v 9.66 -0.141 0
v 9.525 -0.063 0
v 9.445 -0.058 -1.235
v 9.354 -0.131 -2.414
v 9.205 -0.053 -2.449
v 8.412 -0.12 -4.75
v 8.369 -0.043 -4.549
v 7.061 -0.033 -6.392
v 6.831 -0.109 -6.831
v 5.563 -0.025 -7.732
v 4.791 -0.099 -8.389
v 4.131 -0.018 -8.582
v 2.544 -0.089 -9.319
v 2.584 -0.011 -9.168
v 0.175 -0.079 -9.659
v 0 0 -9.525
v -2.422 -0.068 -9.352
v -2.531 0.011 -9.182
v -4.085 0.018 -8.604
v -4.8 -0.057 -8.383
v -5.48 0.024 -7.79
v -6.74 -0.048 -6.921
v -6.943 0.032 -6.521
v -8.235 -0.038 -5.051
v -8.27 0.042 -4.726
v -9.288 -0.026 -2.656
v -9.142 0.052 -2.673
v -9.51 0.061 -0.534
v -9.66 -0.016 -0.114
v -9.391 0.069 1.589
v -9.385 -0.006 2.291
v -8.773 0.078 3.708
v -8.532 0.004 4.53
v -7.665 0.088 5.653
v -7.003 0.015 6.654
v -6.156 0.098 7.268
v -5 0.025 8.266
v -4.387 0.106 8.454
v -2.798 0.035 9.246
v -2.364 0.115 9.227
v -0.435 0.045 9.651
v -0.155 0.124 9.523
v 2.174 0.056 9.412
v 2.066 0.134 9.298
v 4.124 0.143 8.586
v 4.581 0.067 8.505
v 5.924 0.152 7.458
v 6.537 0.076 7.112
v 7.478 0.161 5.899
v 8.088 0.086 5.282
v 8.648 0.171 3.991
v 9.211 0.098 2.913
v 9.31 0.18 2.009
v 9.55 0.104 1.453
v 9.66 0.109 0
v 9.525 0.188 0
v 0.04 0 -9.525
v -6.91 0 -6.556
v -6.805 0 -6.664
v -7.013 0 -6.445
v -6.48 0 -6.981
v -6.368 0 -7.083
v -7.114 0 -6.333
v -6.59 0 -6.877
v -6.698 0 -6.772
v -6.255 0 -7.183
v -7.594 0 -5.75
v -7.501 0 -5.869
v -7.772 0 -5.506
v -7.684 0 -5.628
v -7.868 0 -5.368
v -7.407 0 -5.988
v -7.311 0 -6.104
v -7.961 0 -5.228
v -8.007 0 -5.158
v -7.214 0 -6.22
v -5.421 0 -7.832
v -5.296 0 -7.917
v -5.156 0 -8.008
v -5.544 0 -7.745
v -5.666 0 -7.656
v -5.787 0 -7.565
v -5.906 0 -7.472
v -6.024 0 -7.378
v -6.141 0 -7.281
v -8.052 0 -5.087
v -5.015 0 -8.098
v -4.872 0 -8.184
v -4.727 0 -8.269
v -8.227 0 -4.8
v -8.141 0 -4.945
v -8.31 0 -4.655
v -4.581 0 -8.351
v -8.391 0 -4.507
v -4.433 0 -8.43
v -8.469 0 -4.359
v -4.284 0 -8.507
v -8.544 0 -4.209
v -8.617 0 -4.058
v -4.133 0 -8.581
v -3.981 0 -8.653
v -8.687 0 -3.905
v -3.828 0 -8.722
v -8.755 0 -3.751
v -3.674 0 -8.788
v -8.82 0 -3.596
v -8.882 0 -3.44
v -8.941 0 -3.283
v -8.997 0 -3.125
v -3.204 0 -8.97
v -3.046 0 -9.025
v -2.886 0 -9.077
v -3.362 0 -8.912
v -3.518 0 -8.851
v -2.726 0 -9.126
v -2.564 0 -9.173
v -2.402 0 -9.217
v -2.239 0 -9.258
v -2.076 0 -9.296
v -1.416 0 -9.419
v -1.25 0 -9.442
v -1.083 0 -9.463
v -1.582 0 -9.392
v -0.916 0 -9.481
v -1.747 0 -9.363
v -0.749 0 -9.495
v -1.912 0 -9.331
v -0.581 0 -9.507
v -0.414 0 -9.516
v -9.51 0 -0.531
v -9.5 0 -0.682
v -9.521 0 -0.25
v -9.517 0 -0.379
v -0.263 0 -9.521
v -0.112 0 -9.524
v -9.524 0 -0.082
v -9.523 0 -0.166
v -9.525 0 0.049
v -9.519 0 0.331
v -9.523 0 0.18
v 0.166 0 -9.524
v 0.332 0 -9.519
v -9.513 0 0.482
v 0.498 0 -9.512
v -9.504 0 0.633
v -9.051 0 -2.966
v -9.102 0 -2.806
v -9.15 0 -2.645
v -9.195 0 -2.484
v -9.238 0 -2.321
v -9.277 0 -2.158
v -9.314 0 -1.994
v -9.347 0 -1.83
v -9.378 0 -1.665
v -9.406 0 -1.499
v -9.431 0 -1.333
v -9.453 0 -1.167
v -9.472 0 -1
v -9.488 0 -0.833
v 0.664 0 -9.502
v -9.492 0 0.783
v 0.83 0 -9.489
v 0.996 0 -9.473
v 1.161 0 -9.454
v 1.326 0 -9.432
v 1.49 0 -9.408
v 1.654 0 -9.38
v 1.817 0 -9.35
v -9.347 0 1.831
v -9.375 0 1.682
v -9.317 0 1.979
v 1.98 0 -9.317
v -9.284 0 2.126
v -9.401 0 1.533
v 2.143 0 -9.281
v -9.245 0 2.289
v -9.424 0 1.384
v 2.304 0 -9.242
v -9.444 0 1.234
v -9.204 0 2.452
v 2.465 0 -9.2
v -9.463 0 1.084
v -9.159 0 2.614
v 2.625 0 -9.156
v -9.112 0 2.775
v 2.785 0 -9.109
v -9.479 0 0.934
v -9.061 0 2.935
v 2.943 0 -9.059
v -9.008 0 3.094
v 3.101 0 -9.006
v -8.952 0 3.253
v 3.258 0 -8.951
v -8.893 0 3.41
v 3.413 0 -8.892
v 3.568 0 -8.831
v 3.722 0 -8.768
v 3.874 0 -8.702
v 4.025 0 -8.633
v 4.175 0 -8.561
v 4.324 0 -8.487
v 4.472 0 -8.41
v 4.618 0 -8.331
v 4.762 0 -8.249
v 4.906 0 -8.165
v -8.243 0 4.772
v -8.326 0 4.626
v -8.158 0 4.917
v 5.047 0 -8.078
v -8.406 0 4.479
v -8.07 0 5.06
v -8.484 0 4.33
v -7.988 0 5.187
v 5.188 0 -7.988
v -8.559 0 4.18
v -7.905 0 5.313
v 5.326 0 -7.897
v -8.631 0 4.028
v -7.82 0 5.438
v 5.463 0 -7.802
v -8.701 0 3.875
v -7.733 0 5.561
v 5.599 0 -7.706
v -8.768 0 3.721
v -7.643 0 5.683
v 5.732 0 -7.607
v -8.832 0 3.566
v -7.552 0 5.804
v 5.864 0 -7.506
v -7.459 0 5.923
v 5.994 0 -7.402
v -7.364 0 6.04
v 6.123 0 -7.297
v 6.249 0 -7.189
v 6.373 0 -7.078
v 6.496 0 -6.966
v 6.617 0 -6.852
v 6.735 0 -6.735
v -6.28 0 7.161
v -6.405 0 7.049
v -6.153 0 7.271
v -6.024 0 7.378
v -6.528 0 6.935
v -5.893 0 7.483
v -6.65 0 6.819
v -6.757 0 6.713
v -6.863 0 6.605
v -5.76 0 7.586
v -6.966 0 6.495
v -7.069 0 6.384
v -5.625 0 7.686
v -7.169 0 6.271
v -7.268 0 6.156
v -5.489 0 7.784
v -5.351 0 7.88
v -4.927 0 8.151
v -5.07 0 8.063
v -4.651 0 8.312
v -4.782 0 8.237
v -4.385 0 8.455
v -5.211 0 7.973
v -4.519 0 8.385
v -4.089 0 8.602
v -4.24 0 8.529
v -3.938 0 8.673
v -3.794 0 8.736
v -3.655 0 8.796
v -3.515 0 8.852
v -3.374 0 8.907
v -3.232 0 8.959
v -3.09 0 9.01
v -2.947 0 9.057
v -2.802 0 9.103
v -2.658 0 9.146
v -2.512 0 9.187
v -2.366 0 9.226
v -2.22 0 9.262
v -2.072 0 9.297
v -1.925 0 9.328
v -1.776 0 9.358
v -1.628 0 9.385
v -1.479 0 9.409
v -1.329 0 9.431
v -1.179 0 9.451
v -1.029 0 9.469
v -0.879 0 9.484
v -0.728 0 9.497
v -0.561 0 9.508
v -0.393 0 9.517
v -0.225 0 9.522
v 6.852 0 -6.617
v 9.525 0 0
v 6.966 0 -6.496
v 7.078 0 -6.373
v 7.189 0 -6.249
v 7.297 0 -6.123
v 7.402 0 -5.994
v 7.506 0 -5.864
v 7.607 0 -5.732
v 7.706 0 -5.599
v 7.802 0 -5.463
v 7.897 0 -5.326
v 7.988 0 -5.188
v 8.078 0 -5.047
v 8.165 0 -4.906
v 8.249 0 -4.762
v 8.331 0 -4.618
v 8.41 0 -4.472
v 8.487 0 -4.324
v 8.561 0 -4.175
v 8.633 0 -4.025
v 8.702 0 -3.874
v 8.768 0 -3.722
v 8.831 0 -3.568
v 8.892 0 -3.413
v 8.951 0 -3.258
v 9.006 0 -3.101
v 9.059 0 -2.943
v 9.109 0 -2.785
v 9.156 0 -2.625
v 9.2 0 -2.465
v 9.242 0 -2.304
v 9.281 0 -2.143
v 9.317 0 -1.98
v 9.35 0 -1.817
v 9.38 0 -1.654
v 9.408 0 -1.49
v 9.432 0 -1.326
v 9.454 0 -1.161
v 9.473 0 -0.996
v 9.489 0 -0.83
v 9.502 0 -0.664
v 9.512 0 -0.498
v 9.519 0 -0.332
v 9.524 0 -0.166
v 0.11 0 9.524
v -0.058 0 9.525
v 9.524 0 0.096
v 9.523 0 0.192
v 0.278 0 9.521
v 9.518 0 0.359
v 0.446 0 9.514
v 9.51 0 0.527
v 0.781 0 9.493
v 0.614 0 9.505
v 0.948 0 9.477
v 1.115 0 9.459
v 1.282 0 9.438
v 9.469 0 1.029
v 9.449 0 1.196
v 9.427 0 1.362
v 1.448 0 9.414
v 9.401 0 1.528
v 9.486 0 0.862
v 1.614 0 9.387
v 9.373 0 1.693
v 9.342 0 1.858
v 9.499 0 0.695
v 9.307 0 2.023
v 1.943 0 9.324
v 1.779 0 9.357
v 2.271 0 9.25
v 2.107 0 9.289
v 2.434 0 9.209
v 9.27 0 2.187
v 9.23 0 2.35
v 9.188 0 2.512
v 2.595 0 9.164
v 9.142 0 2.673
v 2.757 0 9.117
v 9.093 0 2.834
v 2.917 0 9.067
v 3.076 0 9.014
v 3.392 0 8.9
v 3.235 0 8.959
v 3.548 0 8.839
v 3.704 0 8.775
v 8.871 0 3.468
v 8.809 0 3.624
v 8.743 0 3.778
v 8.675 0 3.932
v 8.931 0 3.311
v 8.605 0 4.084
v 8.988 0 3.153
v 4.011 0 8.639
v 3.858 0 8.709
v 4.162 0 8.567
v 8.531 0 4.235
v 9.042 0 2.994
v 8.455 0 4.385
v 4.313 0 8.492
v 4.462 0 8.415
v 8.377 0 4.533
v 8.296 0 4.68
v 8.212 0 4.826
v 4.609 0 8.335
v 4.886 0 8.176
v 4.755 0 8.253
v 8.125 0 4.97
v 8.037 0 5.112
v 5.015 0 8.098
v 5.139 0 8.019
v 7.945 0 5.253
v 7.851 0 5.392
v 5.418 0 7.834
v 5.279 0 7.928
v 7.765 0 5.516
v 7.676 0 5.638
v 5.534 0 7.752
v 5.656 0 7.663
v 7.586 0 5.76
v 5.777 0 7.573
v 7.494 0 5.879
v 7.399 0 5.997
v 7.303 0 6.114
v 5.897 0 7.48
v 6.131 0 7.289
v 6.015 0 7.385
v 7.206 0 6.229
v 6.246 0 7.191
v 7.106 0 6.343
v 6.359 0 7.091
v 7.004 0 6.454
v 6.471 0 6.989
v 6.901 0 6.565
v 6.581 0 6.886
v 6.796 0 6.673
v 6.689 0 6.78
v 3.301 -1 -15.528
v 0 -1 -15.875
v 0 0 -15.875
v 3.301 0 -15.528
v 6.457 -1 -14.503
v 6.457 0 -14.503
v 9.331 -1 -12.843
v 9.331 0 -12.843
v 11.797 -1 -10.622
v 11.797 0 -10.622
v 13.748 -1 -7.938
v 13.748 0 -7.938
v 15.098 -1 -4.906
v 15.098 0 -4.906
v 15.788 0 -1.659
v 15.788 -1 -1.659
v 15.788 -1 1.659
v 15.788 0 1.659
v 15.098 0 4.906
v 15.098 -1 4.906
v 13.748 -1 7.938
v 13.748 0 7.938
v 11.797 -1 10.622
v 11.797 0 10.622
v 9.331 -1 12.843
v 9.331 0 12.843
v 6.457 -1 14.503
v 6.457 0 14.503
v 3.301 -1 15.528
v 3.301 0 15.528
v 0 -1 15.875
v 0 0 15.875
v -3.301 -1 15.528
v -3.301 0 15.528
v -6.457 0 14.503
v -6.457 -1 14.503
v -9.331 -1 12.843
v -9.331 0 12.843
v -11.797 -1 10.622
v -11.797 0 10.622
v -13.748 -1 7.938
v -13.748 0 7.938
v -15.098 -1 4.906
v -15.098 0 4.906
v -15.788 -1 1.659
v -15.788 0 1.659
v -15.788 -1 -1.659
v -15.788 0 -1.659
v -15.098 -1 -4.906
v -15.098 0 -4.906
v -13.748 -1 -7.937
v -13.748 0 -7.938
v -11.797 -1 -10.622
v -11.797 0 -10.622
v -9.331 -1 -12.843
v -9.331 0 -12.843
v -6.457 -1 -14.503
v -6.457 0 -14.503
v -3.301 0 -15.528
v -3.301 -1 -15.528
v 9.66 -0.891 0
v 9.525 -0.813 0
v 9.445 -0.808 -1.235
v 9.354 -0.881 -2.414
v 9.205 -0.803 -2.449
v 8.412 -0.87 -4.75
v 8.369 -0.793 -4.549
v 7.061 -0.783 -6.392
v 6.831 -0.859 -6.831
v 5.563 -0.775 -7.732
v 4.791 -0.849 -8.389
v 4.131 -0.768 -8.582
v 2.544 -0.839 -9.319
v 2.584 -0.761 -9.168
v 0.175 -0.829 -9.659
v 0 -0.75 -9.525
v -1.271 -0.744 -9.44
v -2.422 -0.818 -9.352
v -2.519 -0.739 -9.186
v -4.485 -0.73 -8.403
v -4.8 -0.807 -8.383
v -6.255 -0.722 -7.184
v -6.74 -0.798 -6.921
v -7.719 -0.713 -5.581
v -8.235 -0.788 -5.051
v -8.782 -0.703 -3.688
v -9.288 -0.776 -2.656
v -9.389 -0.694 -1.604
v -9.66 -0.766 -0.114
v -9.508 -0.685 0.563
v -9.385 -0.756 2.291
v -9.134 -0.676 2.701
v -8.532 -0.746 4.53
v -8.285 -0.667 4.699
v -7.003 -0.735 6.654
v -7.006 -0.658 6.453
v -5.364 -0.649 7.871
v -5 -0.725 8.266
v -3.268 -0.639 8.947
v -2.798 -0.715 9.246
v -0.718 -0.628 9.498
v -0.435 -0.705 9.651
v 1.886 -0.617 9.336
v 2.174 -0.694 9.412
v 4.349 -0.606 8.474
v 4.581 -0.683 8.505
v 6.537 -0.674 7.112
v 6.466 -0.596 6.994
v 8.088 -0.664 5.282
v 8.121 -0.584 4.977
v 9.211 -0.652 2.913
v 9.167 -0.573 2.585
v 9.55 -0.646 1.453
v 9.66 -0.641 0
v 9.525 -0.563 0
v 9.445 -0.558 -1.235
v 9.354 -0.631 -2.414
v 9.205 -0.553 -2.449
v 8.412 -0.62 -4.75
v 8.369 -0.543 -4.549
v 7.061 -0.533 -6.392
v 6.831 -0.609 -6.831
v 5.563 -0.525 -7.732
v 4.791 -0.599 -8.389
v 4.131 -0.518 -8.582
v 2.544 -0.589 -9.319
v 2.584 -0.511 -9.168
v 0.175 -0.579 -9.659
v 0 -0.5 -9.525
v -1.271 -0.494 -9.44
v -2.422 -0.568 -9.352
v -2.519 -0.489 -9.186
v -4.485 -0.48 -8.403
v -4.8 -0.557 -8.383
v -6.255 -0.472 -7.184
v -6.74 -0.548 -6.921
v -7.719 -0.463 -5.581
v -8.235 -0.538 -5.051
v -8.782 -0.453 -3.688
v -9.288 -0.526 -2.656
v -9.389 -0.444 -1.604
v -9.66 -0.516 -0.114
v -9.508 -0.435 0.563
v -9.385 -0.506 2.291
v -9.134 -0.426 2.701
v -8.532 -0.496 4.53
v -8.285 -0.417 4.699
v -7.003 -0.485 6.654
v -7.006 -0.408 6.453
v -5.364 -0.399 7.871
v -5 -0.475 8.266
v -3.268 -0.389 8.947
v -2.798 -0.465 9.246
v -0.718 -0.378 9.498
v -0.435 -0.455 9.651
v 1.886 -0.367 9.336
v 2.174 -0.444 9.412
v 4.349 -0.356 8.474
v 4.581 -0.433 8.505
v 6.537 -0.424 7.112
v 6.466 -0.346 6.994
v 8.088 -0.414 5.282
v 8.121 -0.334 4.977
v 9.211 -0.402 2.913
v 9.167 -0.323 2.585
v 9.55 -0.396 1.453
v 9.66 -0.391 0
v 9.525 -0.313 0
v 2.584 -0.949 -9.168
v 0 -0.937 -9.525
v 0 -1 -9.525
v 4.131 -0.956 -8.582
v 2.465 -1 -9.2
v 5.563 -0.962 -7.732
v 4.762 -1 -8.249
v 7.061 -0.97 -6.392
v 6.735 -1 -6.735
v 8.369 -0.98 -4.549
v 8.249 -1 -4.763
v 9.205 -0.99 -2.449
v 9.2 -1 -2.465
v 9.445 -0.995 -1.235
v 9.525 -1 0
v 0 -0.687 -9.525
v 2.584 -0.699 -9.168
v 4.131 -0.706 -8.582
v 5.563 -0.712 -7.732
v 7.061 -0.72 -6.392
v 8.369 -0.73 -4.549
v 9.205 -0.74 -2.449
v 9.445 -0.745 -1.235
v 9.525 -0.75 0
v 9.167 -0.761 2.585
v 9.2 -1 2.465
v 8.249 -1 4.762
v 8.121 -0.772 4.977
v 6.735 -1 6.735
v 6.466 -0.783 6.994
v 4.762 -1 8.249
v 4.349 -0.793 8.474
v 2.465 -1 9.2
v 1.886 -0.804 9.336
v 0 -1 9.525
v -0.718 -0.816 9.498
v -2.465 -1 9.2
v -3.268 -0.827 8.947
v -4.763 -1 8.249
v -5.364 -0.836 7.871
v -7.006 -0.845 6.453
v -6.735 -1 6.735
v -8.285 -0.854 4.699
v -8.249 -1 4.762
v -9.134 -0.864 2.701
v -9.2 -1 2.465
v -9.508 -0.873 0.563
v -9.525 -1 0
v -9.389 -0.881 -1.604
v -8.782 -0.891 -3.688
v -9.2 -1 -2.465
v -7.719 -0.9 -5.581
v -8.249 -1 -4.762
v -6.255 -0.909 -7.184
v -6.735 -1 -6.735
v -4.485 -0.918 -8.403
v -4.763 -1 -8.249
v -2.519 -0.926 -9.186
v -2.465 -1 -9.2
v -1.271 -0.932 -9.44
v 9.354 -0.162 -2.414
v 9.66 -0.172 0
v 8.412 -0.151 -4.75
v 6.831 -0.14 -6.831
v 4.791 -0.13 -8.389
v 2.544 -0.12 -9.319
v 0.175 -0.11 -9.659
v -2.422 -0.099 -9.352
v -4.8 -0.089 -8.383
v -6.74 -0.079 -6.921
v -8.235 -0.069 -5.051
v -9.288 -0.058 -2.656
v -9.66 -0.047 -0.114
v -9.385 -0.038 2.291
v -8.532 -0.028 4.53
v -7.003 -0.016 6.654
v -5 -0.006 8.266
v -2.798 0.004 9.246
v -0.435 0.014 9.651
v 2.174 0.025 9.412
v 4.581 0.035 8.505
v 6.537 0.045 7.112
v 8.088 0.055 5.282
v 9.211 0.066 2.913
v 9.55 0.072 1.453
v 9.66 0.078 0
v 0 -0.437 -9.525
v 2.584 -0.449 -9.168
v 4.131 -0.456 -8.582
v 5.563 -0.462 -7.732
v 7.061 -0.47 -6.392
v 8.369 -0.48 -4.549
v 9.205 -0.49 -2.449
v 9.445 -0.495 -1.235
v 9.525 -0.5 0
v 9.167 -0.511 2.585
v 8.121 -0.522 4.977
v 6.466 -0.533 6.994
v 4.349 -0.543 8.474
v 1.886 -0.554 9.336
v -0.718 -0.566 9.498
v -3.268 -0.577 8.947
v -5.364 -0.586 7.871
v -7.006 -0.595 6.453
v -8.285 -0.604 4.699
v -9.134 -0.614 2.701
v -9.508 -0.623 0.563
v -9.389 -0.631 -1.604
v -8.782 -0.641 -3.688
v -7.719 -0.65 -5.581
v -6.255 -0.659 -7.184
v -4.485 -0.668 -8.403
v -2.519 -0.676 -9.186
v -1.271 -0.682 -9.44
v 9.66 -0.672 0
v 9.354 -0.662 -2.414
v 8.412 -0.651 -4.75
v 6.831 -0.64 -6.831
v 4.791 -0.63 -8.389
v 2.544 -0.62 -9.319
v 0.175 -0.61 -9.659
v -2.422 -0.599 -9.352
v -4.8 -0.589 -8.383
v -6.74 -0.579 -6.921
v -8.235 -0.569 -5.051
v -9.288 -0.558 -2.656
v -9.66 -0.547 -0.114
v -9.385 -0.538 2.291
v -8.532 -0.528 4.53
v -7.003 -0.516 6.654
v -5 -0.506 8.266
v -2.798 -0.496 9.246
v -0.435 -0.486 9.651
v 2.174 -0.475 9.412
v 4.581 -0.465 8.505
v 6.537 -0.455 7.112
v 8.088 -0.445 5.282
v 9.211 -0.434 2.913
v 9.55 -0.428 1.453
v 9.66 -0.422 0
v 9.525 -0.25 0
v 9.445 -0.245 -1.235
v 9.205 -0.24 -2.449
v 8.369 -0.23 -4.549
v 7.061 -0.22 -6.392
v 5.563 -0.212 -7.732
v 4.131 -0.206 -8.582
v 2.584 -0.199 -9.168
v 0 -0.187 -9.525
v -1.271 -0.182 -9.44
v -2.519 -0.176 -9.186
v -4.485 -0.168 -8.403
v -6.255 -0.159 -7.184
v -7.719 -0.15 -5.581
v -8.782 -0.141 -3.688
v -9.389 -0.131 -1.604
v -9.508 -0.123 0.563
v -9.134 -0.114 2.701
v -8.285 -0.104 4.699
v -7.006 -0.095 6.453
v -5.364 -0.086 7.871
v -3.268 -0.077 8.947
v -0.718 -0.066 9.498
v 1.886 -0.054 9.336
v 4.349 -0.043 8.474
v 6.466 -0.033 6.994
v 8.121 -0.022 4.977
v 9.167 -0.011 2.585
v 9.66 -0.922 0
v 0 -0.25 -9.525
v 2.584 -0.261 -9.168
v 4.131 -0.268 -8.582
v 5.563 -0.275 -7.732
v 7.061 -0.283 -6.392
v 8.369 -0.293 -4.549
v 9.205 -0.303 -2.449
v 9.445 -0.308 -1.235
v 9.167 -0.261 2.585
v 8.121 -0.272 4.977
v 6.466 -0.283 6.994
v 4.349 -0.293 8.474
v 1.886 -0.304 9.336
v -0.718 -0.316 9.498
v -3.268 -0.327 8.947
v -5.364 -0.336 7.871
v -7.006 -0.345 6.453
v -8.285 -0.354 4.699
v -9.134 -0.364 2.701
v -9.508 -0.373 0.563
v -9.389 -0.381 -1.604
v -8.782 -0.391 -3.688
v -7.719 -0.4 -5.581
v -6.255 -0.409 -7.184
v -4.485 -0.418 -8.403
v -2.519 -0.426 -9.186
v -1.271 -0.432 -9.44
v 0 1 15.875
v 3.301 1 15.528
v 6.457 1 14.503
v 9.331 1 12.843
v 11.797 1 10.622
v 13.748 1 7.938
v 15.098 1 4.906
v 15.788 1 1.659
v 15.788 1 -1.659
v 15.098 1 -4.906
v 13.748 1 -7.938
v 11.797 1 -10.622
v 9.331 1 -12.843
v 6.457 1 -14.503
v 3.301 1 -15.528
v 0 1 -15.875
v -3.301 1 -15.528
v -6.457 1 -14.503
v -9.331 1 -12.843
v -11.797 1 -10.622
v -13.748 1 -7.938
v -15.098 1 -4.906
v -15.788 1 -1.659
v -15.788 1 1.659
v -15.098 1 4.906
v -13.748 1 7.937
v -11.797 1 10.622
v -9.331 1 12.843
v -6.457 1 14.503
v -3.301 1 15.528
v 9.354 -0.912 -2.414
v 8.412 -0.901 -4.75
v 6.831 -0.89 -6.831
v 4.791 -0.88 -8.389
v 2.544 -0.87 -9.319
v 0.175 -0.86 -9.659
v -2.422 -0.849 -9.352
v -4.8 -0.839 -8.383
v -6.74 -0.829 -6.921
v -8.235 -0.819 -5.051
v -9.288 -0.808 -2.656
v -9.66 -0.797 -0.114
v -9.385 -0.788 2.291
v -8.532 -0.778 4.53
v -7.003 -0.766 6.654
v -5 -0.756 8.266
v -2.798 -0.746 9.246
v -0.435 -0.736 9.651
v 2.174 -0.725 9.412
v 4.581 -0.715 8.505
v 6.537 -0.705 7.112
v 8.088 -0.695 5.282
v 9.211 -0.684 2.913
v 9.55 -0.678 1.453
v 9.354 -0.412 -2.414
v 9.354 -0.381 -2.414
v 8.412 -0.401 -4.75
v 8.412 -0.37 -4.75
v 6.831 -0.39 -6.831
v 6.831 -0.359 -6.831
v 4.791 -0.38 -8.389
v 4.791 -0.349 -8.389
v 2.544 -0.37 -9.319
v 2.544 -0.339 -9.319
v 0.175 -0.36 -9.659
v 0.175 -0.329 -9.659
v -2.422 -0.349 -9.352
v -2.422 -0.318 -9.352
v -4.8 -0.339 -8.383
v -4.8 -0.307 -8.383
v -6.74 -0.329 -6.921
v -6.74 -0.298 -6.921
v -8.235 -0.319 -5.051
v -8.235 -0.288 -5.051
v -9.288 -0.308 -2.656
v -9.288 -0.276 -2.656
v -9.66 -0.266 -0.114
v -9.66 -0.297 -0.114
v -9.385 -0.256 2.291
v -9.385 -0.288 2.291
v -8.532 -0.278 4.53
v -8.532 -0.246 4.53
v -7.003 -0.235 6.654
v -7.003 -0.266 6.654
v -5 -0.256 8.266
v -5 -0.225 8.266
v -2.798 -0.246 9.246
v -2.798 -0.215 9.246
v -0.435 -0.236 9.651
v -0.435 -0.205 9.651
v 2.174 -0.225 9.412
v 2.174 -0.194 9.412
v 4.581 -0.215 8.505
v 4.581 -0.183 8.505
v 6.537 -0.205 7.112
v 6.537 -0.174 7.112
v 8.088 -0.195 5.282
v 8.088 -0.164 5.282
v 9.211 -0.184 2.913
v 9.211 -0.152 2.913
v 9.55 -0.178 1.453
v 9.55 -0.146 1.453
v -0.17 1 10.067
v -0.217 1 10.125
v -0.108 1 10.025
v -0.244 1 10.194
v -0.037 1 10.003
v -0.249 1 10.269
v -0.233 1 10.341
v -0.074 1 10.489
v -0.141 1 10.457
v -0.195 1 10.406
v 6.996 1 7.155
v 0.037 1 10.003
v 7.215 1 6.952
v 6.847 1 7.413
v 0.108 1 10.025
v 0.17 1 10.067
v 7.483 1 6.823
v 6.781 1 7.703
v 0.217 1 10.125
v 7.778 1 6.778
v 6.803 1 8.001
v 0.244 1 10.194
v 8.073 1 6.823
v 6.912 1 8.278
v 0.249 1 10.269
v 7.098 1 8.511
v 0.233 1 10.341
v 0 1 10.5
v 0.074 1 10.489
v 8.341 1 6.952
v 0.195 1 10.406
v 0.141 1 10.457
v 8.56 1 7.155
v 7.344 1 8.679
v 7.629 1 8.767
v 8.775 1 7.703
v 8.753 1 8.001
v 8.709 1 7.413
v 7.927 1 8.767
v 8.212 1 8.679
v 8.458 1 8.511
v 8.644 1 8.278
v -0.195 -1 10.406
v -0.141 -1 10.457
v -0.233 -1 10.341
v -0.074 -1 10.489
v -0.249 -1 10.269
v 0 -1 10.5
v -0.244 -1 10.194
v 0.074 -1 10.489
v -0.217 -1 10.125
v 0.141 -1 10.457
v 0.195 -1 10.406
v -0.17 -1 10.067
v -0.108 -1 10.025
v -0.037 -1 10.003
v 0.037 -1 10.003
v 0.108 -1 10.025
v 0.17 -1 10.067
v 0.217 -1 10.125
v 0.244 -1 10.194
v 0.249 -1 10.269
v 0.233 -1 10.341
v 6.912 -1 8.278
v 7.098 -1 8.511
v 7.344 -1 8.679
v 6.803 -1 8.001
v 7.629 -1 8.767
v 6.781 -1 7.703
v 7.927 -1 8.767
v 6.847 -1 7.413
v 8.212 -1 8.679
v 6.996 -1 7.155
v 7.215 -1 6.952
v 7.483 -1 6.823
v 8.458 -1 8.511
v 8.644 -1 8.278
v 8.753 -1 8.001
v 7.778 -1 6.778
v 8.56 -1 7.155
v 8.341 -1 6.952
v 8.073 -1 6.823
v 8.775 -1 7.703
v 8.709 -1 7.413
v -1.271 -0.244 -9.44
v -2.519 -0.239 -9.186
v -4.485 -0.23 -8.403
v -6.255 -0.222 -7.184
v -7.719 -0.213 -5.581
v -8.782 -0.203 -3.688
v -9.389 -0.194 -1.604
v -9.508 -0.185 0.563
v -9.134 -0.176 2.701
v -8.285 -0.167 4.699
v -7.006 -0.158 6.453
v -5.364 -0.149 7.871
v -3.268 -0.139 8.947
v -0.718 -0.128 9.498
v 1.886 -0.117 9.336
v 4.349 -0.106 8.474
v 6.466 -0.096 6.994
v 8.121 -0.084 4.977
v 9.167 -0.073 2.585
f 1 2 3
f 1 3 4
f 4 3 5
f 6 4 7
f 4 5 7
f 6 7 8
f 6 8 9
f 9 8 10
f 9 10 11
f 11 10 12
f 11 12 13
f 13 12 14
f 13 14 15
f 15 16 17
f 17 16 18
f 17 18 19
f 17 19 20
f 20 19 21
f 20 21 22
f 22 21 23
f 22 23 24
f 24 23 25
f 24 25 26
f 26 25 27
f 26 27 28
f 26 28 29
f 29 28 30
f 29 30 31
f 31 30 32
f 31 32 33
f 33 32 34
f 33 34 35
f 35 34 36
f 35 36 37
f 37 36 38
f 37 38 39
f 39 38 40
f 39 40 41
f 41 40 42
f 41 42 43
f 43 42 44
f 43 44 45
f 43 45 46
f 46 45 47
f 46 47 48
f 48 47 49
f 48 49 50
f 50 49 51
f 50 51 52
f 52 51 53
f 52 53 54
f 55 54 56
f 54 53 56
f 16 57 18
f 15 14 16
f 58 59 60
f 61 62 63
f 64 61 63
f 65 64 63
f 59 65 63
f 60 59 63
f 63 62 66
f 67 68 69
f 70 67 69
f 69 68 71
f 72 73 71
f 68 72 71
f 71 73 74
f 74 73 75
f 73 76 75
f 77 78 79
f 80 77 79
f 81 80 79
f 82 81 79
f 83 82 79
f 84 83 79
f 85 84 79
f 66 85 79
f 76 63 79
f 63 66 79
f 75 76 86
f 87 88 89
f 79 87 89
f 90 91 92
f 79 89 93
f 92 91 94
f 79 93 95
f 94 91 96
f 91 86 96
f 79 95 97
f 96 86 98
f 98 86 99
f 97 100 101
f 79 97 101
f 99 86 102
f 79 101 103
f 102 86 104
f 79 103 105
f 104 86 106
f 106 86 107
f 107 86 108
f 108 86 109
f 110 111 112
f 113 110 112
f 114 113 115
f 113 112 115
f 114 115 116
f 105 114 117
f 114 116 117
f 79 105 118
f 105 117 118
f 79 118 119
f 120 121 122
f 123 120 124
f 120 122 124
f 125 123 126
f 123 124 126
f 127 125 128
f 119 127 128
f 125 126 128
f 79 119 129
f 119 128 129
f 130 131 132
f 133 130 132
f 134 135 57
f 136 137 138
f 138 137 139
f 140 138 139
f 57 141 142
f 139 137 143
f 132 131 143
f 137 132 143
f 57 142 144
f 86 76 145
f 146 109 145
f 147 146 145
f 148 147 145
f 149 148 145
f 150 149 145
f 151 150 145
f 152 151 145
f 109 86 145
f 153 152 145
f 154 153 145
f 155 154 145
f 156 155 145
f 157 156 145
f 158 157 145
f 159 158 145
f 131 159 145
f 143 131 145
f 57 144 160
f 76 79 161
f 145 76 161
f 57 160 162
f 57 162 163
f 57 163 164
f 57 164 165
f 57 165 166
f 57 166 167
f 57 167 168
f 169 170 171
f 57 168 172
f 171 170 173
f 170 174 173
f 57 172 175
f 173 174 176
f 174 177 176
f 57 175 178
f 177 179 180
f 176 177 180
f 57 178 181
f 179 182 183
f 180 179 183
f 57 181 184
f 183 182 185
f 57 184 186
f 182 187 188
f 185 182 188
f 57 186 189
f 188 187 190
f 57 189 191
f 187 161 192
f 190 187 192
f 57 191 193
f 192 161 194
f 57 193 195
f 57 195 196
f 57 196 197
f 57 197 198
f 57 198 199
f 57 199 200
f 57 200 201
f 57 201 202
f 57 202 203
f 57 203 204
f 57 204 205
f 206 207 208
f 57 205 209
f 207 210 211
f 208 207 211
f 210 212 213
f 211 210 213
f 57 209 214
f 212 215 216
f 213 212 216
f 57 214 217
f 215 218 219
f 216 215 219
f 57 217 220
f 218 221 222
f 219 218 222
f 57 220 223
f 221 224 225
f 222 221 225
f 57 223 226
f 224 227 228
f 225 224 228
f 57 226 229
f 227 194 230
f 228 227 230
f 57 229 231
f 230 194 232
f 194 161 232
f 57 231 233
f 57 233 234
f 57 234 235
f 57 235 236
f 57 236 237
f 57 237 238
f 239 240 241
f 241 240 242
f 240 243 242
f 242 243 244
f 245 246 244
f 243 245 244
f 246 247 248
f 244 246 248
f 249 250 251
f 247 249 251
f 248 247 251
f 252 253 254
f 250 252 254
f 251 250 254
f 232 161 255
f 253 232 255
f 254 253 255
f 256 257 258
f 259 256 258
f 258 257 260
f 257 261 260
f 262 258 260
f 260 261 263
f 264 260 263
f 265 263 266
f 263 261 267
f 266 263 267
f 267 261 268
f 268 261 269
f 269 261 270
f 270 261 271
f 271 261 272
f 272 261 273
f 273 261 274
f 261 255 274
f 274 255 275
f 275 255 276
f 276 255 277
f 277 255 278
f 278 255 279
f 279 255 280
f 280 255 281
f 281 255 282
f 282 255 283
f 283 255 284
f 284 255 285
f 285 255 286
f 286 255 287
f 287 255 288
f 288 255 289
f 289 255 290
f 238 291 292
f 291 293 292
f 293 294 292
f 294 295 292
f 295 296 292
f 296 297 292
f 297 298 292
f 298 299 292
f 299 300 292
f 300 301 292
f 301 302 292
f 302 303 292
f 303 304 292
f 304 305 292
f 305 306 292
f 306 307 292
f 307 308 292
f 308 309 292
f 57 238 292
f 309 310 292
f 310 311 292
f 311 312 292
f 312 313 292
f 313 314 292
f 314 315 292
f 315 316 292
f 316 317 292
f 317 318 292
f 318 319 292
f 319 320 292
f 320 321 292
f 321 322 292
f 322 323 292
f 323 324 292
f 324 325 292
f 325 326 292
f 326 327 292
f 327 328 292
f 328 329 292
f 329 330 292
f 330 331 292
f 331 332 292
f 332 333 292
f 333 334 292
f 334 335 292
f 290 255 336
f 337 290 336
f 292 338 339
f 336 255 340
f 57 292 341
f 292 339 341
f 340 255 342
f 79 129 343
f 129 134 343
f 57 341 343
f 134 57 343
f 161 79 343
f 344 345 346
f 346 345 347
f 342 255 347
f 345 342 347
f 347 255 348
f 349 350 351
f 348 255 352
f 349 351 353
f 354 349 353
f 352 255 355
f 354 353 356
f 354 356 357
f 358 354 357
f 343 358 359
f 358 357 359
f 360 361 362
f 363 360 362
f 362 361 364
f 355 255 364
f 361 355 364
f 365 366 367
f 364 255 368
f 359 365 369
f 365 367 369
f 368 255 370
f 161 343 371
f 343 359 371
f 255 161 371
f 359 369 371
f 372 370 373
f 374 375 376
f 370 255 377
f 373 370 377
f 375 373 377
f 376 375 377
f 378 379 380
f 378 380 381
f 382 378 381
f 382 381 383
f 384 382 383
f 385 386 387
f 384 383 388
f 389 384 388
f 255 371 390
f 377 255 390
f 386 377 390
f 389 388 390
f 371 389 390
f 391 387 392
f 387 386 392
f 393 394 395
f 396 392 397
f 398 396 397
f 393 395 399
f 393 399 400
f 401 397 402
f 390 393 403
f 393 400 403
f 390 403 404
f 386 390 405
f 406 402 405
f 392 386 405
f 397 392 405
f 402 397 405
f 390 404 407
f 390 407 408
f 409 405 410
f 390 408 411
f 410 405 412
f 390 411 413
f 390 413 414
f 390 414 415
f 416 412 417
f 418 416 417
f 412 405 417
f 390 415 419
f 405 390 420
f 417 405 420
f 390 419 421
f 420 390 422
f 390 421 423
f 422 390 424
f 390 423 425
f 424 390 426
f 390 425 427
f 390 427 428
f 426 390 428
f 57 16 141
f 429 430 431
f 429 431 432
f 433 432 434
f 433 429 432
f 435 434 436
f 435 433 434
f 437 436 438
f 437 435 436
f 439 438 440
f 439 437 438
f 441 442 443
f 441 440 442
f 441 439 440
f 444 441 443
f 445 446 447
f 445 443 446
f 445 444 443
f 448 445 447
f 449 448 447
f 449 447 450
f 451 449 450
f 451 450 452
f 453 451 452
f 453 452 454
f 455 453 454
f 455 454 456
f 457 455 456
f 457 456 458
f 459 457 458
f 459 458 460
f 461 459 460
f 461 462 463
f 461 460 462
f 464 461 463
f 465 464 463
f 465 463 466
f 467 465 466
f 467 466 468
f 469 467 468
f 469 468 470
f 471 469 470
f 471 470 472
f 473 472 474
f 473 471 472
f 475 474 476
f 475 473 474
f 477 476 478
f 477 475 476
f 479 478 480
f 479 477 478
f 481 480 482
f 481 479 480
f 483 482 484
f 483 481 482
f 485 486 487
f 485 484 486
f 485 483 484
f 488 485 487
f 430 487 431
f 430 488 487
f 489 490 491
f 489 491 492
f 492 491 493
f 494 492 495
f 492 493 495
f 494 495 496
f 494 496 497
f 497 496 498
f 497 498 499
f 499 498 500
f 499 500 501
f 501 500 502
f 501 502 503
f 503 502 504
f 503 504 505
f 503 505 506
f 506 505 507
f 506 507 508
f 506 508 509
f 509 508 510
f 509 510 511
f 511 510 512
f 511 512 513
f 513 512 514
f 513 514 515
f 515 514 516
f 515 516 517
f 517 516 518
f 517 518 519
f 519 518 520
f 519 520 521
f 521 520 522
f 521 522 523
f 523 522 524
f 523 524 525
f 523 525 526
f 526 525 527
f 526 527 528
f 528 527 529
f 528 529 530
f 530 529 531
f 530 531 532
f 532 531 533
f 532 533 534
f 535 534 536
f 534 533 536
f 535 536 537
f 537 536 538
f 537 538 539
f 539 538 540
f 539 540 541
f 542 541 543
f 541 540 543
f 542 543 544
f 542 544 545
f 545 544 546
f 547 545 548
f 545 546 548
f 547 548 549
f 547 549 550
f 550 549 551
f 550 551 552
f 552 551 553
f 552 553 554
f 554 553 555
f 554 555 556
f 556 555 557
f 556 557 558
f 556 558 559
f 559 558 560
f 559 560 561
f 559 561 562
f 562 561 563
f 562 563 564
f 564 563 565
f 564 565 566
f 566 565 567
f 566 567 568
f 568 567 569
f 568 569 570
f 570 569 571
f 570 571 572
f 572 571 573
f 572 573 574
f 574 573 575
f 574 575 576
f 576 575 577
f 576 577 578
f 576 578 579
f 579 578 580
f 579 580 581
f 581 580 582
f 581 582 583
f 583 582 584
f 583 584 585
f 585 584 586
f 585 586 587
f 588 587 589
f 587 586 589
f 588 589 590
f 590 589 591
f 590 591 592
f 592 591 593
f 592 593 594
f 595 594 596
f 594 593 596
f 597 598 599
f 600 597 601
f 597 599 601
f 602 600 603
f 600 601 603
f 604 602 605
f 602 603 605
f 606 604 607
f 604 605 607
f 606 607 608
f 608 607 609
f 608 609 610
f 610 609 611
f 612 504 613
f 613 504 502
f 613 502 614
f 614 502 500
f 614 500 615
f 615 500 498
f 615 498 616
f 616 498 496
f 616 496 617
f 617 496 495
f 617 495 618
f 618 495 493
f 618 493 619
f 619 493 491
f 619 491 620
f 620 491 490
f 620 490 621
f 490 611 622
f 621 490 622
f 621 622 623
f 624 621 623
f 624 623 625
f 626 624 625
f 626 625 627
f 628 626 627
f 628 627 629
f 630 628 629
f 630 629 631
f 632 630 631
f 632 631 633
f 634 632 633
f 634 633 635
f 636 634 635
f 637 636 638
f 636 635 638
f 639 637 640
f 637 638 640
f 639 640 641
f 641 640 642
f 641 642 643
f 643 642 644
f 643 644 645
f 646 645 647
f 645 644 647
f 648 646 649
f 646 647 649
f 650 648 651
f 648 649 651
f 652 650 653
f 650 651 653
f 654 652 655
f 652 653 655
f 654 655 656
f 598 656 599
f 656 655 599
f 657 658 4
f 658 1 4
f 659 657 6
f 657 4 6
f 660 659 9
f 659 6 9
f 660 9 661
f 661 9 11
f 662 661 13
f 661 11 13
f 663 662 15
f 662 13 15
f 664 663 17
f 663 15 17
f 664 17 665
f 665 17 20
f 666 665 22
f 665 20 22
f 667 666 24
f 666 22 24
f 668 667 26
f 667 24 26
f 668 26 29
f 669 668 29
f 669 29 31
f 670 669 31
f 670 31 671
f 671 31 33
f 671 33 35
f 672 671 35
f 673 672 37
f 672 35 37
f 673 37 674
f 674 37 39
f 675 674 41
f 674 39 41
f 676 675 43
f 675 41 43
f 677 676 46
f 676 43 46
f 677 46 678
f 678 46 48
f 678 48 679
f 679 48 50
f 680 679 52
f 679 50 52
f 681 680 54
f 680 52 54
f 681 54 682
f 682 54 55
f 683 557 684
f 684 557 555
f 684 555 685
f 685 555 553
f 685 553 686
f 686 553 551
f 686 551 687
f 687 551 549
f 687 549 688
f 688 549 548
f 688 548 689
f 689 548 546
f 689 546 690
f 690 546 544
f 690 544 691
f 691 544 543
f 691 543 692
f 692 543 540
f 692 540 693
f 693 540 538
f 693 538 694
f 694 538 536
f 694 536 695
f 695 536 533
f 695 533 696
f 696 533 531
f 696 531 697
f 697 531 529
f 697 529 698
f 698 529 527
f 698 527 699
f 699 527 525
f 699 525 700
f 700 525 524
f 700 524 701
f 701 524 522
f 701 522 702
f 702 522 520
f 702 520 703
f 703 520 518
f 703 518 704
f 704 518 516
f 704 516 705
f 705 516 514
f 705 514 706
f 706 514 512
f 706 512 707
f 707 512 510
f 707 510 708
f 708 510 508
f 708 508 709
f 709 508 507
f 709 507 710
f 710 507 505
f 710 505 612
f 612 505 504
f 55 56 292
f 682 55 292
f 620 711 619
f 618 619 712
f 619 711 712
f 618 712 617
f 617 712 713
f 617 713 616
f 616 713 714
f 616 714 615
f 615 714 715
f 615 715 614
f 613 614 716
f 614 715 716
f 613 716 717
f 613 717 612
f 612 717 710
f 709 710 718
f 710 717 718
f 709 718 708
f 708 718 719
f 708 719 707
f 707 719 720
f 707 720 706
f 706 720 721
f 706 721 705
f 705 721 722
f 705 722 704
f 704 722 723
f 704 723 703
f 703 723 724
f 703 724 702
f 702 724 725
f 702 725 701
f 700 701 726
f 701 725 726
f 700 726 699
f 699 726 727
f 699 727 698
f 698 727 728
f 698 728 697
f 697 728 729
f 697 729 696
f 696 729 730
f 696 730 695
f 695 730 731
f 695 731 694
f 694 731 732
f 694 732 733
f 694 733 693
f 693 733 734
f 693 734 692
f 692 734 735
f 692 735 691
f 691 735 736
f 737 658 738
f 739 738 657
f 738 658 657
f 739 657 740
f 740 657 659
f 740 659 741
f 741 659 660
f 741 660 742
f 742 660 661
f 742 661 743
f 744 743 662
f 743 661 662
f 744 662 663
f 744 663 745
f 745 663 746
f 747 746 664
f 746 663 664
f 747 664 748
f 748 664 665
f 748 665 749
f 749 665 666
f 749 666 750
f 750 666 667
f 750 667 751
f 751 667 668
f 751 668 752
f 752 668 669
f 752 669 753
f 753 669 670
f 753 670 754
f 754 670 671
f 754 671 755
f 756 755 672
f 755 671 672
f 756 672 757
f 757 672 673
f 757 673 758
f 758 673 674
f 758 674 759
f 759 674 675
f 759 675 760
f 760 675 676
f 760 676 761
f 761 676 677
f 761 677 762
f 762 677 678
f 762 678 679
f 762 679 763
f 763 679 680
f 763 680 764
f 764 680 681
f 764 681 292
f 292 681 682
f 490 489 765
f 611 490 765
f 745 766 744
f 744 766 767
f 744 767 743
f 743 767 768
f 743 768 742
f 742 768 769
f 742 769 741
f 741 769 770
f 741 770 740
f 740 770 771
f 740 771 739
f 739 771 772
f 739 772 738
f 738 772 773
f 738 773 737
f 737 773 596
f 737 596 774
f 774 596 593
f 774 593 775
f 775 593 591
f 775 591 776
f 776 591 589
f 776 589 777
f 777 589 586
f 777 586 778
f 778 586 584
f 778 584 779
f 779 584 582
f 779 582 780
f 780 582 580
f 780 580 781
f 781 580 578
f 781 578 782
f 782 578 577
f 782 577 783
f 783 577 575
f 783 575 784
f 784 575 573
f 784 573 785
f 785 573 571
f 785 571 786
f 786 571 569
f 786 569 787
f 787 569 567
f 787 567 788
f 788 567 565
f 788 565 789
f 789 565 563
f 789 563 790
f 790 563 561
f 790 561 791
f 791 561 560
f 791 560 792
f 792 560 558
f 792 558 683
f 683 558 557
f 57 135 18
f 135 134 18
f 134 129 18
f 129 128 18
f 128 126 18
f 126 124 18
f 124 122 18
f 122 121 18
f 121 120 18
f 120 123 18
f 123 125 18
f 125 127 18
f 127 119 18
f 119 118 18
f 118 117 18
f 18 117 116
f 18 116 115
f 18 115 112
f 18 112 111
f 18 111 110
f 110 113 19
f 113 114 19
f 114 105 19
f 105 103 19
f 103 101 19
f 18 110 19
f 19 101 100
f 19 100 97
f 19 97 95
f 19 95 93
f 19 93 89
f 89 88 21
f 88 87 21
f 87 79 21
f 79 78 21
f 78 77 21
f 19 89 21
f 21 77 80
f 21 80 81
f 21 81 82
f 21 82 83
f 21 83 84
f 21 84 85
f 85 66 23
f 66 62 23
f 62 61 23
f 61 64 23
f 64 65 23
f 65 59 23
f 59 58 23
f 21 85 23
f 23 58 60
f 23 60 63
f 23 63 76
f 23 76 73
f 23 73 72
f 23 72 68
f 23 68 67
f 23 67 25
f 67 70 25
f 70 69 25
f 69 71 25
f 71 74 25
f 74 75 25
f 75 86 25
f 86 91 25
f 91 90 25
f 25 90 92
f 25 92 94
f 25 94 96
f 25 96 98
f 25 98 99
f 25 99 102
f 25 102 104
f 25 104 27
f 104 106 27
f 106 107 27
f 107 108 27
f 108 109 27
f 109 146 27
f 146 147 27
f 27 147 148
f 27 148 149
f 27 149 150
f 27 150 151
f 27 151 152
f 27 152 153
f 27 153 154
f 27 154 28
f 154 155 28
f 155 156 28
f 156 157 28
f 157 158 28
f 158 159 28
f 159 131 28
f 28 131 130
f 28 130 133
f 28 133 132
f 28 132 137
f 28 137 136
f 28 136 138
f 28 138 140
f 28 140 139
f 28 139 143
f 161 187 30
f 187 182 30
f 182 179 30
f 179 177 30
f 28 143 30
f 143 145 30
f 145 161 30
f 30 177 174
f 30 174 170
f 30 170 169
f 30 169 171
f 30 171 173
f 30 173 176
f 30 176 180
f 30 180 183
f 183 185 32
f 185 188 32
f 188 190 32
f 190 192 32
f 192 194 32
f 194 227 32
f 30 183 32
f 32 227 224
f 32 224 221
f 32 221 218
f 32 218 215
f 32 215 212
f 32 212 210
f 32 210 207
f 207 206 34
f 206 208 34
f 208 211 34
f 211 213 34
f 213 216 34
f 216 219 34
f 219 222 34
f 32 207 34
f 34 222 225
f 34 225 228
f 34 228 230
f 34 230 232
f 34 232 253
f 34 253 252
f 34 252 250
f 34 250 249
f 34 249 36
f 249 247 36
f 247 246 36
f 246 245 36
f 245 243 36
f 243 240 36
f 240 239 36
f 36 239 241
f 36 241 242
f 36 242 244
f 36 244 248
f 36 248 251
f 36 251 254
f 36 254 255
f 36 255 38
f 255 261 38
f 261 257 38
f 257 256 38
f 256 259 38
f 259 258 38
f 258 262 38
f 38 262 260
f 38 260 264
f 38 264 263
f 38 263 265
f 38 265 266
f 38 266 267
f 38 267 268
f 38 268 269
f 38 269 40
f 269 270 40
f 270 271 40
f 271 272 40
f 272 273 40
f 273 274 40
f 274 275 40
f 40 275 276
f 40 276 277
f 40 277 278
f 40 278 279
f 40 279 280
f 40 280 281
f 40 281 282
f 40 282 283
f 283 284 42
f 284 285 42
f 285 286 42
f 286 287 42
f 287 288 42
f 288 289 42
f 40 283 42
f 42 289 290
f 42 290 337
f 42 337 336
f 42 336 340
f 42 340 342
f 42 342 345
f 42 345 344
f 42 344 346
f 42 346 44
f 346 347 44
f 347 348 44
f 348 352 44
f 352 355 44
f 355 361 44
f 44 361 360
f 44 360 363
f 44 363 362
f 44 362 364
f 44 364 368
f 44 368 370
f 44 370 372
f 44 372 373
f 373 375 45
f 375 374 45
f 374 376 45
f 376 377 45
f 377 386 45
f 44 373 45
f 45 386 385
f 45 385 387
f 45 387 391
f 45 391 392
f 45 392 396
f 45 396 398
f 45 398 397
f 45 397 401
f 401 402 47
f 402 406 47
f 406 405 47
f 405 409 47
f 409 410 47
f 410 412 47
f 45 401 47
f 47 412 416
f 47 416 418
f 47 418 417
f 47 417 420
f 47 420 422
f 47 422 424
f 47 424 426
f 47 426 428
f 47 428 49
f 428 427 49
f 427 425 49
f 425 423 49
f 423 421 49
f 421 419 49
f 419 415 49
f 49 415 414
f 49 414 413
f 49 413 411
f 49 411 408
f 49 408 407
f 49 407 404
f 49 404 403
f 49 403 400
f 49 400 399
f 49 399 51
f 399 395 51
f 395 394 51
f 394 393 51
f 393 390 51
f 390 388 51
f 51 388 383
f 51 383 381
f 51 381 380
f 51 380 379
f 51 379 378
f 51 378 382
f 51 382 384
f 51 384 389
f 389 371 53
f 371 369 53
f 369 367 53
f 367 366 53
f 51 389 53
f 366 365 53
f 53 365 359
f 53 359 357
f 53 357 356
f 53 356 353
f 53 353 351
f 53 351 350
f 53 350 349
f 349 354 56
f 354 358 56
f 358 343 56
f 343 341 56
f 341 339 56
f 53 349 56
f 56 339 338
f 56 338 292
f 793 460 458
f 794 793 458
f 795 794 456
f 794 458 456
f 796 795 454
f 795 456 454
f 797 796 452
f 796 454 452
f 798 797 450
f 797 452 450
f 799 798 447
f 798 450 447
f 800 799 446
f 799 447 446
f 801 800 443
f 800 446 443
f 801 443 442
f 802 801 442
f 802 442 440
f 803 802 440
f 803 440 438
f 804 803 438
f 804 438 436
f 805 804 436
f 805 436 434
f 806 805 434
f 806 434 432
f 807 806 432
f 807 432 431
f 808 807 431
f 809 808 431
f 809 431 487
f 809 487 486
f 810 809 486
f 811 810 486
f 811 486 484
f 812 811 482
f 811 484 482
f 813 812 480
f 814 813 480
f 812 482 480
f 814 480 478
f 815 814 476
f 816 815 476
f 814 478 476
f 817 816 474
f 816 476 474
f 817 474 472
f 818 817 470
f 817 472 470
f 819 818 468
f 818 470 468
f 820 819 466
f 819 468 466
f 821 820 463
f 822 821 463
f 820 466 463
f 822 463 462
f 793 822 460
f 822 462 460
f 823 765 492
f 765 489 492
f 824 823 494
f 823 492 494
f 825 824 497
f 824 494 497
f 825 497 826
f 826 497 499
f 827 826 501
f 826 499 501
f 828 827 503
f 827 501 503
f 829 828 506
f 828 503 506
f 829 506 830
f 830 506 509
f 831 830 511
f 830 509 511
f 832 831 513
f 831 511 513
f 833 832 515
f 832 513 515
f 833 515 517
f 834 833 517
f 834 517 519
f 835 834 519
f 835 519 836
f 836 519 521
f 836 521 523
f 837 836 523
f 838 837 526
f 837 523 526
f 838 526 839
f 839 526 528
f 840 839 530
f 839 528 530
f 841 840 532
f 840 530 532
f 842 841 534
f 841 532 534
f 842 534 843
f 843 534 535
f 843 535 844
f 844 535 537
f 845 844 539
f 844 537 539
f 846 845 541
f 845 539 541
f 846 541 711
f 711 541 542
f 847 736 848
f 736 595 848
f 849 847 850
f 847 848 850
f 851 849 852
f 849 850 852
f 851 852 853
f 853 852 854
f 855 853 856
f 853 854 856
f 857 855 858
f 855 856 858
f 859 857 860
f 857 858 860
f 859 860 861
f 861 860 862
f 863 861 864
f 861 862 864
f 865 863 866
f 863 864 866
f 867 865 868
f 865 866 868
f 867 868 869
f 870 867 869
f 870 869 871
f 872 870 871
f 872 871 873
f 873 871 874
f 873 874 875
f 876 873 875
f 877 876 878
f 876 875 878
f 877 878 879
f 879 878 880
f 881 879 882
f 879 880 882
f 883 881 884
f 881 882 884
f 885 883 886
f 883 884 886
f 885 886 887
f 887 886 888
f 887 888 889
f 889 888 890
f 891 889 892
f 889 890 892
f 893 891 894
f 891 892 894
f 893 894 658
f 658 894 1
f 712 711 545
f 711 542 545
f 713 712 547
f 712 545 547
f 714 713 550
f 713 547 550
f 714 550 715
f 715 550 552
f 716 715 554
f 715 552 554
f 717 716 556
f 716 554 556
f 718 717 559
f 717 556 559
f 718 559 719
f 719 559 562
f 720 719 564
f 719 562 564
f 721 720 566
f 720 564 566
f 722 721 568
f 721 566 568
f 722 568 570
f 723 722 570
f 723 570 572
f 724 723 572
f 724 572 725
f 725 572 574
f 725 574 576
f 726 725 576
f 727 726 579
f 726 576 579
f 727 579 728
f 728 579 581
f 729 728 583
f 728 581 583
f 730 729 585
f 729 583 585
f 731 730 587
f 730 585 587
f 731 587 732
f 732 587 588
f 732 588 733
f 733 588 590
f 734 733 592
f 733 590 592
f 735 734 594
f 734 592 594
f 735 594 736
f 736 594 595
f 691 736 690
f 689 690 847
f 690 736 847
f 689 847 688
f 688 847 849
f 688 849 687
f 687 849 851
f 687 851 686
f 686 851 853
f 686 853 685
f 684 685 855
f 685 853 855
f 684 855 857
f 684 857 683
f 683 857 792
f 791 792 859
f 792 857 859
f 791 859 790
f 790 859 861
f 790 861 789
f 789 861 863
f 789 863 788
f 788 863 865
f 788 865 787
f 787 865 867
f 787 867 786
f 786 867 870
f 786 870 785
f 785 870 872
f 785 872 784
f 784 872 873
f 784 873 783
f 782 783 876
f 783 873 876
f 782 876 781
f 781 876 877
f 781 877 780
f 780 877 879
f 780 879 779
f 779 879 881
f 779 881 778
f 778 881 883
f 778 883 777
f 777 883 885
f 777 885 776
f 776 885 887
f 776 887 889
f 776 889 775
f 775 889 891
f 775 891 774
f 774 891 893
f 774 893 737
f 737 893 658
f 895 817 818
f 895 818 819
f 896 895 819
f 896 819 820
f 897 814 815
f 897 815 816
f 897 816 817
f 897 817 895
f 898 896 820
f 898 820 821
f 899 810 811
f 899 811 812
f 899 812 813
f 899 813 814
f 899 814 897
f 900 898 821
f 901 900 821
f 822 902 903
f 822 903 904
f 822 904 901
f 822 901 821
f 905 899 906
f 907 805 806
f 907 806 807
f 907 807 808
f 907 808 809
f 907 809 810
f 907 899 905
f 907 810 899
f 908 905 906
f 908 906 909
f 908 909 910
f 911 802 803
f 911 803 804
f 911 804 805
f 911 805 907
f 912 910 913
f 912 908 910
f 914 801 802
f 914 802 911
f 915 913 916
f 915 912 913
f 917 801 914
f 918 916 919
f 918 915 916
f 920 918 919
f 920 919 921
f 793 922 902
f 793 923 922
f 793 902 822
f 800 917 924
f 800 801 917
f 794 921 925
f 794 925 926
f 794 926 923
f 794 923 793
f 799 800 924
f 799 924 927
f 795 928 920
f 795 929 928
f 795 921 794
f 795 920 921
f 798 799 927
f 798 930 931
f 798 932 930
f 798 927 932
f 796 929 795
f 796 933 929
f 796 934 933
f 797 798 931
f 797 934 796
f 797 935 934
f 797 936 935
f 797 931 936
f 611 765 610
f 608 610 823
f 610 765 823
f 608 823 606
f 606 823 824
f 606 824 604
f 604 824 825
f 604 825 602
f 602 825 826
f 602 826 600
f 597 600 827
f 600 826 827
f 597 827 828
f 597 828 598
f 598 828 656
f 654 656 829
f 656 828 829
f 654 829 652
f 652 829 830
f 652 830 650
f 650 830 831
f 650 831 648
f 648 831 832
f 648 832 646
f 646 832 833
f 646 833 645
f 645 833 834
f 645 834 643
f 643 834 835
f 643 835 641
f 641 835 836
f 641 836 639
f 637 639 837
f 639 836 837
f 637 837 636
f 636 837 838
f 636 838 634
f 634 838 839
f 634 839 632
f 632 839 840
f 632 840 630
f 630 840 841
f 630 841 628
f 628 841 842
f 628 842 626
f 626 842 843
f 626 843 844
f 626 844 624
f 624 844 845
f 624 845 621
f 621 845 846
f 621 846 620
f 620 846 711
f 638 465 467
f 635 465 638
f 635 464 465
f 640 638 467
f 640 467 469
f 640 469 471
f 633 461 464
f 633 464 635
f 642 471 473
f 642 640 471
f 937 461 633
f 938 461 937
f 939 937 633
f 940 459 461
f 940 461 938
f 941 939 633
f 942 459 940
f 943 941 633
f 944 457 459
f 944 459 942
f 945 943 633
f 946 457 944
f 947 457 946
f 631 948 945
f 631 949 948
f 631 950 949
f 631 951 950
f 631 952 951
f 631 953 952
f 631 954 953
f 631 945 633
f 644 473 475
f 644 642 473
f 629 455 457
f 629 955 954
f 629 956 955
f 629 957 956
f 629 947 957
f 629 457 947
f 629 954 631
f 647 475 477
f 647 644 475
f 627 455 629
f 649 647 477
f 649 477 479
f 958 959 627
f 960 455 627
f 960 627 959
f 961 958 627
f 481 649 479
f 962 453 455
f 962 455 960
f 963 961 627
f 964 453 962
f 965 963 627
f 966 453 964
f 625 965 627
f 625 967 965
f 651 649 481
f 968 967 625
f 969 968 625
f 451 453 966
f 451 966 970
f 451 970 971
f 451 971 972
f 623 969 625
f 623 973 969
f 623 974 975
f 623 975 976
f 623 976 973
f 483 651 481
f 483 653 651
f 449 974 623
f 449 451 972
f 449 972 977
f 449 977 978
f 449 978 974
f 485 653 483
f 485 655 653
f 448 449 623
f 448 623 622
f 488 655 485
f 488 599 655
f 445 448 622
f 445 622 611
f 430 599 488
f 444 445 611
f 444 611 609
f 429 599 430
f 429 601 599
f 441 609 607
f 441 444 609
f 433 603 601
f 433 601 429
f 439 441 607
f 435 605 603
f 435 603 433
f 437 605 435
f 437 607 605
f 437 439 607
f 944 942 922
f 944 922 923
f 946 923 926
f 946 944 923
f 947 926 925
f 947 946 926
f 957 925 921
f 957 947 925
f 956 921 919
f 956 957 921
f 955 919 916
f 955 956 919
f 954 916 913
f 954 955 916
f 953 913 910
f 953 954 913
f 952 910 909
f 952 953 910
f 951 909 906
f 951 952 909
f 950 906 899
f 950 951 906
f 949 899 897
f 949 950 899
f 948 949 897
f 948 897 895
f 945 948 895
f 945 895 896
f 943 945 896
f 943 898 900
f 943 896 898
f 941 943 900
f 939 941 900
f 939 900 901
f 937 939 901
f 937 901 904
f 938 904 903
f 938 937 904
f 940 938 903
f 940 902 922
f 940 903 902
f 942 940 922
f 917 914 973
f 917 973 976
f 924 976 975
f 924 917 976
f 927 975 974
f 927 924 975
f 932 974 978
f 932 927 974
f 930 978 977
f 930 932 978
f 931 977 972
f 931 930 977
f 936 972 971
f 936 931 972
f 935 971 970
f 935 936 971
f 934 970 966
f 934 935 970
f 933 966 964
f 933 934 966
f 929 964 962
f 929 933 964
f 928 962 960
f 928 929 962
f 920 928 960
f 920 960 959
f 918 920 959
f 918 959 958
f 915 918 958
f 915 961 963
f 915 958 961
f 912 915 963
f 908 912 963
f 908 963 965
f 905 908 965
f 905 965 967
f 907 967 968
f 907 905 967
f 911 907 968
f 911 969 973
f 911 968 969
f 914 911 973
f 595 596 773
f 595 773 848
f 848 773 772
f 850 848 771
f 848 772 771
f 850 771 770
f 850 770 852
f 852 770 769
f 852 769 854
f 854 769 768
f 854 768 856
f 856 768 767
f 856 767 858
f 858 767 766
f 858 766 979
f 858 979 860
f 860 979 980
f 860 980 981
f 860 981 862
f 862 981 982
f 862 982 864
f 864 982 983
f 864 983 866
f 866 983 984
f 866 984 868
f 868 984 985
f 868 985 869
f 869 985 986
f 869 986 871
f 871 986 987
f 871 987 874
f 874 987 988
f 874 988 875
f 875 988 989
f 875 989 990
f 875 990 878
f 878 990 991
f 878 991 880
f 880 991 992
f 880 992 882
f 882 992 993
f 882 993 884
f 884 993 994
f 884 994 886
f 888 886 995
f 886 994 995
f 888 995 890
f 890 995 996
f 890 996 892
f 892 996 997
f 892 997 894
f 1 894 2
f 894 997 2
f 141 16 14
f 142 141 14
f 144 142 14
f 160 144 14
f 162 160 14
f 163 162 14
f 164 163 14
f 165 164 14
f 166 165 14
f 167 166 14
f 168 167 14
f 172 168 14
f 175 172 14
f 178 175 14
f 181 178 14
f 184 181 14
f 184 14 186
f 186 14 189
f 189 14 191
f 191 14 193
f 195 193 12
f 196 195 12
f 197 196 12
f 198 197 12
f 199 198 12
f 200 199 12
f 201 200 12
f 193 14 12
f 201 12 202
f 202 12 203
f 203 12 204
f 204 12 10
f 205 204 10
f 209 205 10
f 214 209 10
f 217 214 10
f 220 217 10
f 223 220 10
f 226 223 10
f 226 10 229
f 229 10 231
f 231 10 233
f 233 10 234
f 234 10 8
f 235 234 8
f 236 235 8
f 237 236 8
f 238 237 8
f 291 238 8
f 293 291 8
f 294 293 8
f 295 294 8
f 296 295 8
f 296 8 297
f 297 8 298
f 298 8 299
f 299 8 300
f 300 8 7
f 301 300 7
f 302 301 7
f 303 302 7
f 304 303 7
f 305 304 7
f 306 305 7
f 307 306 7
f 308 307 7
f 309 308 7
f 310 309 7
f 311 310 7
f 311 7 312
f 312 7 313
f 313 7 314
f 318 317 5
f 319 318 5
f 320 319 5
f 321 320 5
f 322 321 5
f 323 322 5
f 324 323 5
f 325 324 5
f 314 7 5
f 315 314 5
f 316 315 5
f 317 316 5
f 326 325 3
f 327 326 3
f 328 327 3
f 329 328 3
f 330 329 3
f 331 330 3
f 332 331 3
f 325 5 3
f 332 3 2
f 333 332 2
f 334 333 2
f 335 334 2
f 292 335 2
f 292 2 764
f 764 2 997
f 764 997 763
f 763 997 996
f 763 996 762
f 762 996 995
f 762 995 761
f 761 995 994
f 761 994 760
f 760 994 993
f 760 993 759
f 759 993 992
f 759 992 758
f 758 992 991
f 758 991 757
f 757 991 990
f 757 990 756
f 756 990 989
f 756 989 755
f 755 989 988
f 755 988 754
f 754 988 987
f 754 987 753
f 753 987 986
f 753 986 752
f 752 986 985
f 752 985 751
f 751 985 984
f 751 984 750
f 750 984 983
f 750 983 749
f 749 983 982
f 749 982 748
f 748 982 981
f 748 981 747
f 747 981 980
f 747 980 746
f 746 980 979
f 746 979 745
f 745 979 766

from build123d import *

# Parameters (mm, degrees)
SKETCH1_R               = 15.875
BOSS_EXTRUDE1_DEPTH     = 1
BOSS_EXTRUDE2_START     = 1
SKETCH2_R               = 15.875
SKETCH2_R_2             = 9.525
BOSS_EXTRUDE2_DEPTH     = 1
THREAD1_PITCH           = 0.25
CUT_EXTRUDE1_DEPTH      = 23.539548638
CUT_EXTRUDE1_DEPTH_BACK = 23.539548638
SKETCH3_R               = 0.25
CUT_EXTRUDE2_DEPTH      = 23.539548576
CUT_EXTRUDE2_DEPTH_BACK = 23.539548576
SKETCH4_R               = 1


with BuildPart() as part:
    # Sketch1 → Boss-Extrude1 (new body)
    with BuildSketch(Plane(origin=(0, 0, 0), x_dir=(1, 0, 0), z_dir=(0, 1, 0))):
        with Locations(Location((0, 0, 0), (0, 0, 270))):
            Circle(SKETCH1_R)
    extrude(amount=BOSS_EXTRUDE1_DEPTH)

    # Sketch2 → Boss-Extrude2 (add)
    with BuildSketch(Plane.XZ.offset(BOSS_EXTRUDE2_START)):
        with Locations(Location((0, 0, 0), (0, 0, 270))):
            Circle(SKETCH2_R)
        with Locations(Location((0, 0, 0), (0, 0, 270))):
            Circle(SKETCH2_R_2, mode=Mode.SUBTRACT)
    extrude(amount=-BOSS_EXTRUDE2_DEPTH)

    # Thread1: the profile of Thread Profile1 profile screwed along a right-hand helix of 4 turns, 6 arcs to a turn; built about Z, then put on its axis
    thread1_z = Axis((0, 0, 0), (0, 0, 1))
    thread1_corners = [(9.5247, 0, -0.000173205), (9.660316469, 0, 0.078125), (9.660316469, 0, 0.109375), (9.5247, 0, 0.187673204)]
    with BuildLine(mode=Mode.PRIVATE) as thread1_profile:
        Line(thread1_corners[0], thread1_corners[1])
        Line(thread1_corners[1], thread1_corners[2])
        Line(thread1_corners[2], thread1_corners[3])
        Line(thread1_corners[3], thread1_corners[0])
    thread1_cap = Face(thread1_profile.wire())
    thread1_turn_angles = [0, 30, 60, 90, 120, 150, 180, 210, 240, 270, 300, 330, 360]
    thread1_turn_weights = [1, 0.8660254037844387, 1, 0.8660254037844387, 1, 0.8660254037844387, 1, 0.8660254037844387, 1, 0.8660254037844387, 1, 0.8660254037844387, 1]
    thread1_turn_rails = [Edge.make_bspline([Vector(p[0], p[1], 0).rotate(thread1_z, thread1_turn_angles[k]) / thread1_turn_weights[k] + Vector(0, 0, p[2] + THREAD1_PITCH * thread1_turn_angles[k] / 360) for k in range(13)], [0, 0, 0, 1, 1, 2, 2, 3, 3, 4, 4, 5, 5, 6, 6, 6], 2, thread1_turn_weights) for p in thread1_corners]
    thread1_turn_sides = [Face.make_surface_from_curves(thread1_turn_rails[p[0]], thread1_turn_rails[p[1]]) for p in [(0, 1), (1, 2), (2, 3), (3, 0)]]
    thread1 = Plane(origin=(0, -1, 0), x_dir=(1, 0, 0), z_dir=(0, 1, 0)) * Solid(Shell([*[p.moved(Location((0, 0, THREAD1_PITCH * i))) for i in range(4) for p in thread1_turn_sides], thread1_cap, thread1_cap.rotate(thread1_z, 1440).moved(Location((0, 0, THREAD1_PITCH * 1440 / 360)))]))
    add(thread1, mode=Mode.SUBTRACT)

    # Sketch3 → Cut-Extrude1 (cut, two sides: drawn at the far end of the back side and taken through both)
    with BuildSketch(Plane(origin=(0, 1, 0), x_dir=(1, 0, 0), z_dir=(0, 1, 0)).offset(-CUT_EXTRUDE1_DEPTH_BACK)):
        with Locations(Location((0, -10.25, 0), (0, 0, 270))):
            Circle(SKETCH3_R)
    extrude(amount=CUT_EXTRUDE1_DEPTH + CUT_EXTRUDE1_DEPTH_BACK, mode=Mode.SUBTRACT)

    # Sketch4 → Cut-Extrude2 (cut, two sides: drawn at the far end of the back side and taken through both)
    with BuildSketch(Plane.XZ.offset(1).offset(-CUT_EXTRUDE2_DEPTH_BACK)):
        with Locations(Location((7.778174593, 7.778174593, 0), (0, 0, 270))):
            Circle(SKETCH4_R)
    extrude(amount=CUT_EXTRUDE2_DEPTH + CUT_EXTRUDE2_DEPTH_BACK, mode=Mode.SUBTRACT)


solid = part.part
